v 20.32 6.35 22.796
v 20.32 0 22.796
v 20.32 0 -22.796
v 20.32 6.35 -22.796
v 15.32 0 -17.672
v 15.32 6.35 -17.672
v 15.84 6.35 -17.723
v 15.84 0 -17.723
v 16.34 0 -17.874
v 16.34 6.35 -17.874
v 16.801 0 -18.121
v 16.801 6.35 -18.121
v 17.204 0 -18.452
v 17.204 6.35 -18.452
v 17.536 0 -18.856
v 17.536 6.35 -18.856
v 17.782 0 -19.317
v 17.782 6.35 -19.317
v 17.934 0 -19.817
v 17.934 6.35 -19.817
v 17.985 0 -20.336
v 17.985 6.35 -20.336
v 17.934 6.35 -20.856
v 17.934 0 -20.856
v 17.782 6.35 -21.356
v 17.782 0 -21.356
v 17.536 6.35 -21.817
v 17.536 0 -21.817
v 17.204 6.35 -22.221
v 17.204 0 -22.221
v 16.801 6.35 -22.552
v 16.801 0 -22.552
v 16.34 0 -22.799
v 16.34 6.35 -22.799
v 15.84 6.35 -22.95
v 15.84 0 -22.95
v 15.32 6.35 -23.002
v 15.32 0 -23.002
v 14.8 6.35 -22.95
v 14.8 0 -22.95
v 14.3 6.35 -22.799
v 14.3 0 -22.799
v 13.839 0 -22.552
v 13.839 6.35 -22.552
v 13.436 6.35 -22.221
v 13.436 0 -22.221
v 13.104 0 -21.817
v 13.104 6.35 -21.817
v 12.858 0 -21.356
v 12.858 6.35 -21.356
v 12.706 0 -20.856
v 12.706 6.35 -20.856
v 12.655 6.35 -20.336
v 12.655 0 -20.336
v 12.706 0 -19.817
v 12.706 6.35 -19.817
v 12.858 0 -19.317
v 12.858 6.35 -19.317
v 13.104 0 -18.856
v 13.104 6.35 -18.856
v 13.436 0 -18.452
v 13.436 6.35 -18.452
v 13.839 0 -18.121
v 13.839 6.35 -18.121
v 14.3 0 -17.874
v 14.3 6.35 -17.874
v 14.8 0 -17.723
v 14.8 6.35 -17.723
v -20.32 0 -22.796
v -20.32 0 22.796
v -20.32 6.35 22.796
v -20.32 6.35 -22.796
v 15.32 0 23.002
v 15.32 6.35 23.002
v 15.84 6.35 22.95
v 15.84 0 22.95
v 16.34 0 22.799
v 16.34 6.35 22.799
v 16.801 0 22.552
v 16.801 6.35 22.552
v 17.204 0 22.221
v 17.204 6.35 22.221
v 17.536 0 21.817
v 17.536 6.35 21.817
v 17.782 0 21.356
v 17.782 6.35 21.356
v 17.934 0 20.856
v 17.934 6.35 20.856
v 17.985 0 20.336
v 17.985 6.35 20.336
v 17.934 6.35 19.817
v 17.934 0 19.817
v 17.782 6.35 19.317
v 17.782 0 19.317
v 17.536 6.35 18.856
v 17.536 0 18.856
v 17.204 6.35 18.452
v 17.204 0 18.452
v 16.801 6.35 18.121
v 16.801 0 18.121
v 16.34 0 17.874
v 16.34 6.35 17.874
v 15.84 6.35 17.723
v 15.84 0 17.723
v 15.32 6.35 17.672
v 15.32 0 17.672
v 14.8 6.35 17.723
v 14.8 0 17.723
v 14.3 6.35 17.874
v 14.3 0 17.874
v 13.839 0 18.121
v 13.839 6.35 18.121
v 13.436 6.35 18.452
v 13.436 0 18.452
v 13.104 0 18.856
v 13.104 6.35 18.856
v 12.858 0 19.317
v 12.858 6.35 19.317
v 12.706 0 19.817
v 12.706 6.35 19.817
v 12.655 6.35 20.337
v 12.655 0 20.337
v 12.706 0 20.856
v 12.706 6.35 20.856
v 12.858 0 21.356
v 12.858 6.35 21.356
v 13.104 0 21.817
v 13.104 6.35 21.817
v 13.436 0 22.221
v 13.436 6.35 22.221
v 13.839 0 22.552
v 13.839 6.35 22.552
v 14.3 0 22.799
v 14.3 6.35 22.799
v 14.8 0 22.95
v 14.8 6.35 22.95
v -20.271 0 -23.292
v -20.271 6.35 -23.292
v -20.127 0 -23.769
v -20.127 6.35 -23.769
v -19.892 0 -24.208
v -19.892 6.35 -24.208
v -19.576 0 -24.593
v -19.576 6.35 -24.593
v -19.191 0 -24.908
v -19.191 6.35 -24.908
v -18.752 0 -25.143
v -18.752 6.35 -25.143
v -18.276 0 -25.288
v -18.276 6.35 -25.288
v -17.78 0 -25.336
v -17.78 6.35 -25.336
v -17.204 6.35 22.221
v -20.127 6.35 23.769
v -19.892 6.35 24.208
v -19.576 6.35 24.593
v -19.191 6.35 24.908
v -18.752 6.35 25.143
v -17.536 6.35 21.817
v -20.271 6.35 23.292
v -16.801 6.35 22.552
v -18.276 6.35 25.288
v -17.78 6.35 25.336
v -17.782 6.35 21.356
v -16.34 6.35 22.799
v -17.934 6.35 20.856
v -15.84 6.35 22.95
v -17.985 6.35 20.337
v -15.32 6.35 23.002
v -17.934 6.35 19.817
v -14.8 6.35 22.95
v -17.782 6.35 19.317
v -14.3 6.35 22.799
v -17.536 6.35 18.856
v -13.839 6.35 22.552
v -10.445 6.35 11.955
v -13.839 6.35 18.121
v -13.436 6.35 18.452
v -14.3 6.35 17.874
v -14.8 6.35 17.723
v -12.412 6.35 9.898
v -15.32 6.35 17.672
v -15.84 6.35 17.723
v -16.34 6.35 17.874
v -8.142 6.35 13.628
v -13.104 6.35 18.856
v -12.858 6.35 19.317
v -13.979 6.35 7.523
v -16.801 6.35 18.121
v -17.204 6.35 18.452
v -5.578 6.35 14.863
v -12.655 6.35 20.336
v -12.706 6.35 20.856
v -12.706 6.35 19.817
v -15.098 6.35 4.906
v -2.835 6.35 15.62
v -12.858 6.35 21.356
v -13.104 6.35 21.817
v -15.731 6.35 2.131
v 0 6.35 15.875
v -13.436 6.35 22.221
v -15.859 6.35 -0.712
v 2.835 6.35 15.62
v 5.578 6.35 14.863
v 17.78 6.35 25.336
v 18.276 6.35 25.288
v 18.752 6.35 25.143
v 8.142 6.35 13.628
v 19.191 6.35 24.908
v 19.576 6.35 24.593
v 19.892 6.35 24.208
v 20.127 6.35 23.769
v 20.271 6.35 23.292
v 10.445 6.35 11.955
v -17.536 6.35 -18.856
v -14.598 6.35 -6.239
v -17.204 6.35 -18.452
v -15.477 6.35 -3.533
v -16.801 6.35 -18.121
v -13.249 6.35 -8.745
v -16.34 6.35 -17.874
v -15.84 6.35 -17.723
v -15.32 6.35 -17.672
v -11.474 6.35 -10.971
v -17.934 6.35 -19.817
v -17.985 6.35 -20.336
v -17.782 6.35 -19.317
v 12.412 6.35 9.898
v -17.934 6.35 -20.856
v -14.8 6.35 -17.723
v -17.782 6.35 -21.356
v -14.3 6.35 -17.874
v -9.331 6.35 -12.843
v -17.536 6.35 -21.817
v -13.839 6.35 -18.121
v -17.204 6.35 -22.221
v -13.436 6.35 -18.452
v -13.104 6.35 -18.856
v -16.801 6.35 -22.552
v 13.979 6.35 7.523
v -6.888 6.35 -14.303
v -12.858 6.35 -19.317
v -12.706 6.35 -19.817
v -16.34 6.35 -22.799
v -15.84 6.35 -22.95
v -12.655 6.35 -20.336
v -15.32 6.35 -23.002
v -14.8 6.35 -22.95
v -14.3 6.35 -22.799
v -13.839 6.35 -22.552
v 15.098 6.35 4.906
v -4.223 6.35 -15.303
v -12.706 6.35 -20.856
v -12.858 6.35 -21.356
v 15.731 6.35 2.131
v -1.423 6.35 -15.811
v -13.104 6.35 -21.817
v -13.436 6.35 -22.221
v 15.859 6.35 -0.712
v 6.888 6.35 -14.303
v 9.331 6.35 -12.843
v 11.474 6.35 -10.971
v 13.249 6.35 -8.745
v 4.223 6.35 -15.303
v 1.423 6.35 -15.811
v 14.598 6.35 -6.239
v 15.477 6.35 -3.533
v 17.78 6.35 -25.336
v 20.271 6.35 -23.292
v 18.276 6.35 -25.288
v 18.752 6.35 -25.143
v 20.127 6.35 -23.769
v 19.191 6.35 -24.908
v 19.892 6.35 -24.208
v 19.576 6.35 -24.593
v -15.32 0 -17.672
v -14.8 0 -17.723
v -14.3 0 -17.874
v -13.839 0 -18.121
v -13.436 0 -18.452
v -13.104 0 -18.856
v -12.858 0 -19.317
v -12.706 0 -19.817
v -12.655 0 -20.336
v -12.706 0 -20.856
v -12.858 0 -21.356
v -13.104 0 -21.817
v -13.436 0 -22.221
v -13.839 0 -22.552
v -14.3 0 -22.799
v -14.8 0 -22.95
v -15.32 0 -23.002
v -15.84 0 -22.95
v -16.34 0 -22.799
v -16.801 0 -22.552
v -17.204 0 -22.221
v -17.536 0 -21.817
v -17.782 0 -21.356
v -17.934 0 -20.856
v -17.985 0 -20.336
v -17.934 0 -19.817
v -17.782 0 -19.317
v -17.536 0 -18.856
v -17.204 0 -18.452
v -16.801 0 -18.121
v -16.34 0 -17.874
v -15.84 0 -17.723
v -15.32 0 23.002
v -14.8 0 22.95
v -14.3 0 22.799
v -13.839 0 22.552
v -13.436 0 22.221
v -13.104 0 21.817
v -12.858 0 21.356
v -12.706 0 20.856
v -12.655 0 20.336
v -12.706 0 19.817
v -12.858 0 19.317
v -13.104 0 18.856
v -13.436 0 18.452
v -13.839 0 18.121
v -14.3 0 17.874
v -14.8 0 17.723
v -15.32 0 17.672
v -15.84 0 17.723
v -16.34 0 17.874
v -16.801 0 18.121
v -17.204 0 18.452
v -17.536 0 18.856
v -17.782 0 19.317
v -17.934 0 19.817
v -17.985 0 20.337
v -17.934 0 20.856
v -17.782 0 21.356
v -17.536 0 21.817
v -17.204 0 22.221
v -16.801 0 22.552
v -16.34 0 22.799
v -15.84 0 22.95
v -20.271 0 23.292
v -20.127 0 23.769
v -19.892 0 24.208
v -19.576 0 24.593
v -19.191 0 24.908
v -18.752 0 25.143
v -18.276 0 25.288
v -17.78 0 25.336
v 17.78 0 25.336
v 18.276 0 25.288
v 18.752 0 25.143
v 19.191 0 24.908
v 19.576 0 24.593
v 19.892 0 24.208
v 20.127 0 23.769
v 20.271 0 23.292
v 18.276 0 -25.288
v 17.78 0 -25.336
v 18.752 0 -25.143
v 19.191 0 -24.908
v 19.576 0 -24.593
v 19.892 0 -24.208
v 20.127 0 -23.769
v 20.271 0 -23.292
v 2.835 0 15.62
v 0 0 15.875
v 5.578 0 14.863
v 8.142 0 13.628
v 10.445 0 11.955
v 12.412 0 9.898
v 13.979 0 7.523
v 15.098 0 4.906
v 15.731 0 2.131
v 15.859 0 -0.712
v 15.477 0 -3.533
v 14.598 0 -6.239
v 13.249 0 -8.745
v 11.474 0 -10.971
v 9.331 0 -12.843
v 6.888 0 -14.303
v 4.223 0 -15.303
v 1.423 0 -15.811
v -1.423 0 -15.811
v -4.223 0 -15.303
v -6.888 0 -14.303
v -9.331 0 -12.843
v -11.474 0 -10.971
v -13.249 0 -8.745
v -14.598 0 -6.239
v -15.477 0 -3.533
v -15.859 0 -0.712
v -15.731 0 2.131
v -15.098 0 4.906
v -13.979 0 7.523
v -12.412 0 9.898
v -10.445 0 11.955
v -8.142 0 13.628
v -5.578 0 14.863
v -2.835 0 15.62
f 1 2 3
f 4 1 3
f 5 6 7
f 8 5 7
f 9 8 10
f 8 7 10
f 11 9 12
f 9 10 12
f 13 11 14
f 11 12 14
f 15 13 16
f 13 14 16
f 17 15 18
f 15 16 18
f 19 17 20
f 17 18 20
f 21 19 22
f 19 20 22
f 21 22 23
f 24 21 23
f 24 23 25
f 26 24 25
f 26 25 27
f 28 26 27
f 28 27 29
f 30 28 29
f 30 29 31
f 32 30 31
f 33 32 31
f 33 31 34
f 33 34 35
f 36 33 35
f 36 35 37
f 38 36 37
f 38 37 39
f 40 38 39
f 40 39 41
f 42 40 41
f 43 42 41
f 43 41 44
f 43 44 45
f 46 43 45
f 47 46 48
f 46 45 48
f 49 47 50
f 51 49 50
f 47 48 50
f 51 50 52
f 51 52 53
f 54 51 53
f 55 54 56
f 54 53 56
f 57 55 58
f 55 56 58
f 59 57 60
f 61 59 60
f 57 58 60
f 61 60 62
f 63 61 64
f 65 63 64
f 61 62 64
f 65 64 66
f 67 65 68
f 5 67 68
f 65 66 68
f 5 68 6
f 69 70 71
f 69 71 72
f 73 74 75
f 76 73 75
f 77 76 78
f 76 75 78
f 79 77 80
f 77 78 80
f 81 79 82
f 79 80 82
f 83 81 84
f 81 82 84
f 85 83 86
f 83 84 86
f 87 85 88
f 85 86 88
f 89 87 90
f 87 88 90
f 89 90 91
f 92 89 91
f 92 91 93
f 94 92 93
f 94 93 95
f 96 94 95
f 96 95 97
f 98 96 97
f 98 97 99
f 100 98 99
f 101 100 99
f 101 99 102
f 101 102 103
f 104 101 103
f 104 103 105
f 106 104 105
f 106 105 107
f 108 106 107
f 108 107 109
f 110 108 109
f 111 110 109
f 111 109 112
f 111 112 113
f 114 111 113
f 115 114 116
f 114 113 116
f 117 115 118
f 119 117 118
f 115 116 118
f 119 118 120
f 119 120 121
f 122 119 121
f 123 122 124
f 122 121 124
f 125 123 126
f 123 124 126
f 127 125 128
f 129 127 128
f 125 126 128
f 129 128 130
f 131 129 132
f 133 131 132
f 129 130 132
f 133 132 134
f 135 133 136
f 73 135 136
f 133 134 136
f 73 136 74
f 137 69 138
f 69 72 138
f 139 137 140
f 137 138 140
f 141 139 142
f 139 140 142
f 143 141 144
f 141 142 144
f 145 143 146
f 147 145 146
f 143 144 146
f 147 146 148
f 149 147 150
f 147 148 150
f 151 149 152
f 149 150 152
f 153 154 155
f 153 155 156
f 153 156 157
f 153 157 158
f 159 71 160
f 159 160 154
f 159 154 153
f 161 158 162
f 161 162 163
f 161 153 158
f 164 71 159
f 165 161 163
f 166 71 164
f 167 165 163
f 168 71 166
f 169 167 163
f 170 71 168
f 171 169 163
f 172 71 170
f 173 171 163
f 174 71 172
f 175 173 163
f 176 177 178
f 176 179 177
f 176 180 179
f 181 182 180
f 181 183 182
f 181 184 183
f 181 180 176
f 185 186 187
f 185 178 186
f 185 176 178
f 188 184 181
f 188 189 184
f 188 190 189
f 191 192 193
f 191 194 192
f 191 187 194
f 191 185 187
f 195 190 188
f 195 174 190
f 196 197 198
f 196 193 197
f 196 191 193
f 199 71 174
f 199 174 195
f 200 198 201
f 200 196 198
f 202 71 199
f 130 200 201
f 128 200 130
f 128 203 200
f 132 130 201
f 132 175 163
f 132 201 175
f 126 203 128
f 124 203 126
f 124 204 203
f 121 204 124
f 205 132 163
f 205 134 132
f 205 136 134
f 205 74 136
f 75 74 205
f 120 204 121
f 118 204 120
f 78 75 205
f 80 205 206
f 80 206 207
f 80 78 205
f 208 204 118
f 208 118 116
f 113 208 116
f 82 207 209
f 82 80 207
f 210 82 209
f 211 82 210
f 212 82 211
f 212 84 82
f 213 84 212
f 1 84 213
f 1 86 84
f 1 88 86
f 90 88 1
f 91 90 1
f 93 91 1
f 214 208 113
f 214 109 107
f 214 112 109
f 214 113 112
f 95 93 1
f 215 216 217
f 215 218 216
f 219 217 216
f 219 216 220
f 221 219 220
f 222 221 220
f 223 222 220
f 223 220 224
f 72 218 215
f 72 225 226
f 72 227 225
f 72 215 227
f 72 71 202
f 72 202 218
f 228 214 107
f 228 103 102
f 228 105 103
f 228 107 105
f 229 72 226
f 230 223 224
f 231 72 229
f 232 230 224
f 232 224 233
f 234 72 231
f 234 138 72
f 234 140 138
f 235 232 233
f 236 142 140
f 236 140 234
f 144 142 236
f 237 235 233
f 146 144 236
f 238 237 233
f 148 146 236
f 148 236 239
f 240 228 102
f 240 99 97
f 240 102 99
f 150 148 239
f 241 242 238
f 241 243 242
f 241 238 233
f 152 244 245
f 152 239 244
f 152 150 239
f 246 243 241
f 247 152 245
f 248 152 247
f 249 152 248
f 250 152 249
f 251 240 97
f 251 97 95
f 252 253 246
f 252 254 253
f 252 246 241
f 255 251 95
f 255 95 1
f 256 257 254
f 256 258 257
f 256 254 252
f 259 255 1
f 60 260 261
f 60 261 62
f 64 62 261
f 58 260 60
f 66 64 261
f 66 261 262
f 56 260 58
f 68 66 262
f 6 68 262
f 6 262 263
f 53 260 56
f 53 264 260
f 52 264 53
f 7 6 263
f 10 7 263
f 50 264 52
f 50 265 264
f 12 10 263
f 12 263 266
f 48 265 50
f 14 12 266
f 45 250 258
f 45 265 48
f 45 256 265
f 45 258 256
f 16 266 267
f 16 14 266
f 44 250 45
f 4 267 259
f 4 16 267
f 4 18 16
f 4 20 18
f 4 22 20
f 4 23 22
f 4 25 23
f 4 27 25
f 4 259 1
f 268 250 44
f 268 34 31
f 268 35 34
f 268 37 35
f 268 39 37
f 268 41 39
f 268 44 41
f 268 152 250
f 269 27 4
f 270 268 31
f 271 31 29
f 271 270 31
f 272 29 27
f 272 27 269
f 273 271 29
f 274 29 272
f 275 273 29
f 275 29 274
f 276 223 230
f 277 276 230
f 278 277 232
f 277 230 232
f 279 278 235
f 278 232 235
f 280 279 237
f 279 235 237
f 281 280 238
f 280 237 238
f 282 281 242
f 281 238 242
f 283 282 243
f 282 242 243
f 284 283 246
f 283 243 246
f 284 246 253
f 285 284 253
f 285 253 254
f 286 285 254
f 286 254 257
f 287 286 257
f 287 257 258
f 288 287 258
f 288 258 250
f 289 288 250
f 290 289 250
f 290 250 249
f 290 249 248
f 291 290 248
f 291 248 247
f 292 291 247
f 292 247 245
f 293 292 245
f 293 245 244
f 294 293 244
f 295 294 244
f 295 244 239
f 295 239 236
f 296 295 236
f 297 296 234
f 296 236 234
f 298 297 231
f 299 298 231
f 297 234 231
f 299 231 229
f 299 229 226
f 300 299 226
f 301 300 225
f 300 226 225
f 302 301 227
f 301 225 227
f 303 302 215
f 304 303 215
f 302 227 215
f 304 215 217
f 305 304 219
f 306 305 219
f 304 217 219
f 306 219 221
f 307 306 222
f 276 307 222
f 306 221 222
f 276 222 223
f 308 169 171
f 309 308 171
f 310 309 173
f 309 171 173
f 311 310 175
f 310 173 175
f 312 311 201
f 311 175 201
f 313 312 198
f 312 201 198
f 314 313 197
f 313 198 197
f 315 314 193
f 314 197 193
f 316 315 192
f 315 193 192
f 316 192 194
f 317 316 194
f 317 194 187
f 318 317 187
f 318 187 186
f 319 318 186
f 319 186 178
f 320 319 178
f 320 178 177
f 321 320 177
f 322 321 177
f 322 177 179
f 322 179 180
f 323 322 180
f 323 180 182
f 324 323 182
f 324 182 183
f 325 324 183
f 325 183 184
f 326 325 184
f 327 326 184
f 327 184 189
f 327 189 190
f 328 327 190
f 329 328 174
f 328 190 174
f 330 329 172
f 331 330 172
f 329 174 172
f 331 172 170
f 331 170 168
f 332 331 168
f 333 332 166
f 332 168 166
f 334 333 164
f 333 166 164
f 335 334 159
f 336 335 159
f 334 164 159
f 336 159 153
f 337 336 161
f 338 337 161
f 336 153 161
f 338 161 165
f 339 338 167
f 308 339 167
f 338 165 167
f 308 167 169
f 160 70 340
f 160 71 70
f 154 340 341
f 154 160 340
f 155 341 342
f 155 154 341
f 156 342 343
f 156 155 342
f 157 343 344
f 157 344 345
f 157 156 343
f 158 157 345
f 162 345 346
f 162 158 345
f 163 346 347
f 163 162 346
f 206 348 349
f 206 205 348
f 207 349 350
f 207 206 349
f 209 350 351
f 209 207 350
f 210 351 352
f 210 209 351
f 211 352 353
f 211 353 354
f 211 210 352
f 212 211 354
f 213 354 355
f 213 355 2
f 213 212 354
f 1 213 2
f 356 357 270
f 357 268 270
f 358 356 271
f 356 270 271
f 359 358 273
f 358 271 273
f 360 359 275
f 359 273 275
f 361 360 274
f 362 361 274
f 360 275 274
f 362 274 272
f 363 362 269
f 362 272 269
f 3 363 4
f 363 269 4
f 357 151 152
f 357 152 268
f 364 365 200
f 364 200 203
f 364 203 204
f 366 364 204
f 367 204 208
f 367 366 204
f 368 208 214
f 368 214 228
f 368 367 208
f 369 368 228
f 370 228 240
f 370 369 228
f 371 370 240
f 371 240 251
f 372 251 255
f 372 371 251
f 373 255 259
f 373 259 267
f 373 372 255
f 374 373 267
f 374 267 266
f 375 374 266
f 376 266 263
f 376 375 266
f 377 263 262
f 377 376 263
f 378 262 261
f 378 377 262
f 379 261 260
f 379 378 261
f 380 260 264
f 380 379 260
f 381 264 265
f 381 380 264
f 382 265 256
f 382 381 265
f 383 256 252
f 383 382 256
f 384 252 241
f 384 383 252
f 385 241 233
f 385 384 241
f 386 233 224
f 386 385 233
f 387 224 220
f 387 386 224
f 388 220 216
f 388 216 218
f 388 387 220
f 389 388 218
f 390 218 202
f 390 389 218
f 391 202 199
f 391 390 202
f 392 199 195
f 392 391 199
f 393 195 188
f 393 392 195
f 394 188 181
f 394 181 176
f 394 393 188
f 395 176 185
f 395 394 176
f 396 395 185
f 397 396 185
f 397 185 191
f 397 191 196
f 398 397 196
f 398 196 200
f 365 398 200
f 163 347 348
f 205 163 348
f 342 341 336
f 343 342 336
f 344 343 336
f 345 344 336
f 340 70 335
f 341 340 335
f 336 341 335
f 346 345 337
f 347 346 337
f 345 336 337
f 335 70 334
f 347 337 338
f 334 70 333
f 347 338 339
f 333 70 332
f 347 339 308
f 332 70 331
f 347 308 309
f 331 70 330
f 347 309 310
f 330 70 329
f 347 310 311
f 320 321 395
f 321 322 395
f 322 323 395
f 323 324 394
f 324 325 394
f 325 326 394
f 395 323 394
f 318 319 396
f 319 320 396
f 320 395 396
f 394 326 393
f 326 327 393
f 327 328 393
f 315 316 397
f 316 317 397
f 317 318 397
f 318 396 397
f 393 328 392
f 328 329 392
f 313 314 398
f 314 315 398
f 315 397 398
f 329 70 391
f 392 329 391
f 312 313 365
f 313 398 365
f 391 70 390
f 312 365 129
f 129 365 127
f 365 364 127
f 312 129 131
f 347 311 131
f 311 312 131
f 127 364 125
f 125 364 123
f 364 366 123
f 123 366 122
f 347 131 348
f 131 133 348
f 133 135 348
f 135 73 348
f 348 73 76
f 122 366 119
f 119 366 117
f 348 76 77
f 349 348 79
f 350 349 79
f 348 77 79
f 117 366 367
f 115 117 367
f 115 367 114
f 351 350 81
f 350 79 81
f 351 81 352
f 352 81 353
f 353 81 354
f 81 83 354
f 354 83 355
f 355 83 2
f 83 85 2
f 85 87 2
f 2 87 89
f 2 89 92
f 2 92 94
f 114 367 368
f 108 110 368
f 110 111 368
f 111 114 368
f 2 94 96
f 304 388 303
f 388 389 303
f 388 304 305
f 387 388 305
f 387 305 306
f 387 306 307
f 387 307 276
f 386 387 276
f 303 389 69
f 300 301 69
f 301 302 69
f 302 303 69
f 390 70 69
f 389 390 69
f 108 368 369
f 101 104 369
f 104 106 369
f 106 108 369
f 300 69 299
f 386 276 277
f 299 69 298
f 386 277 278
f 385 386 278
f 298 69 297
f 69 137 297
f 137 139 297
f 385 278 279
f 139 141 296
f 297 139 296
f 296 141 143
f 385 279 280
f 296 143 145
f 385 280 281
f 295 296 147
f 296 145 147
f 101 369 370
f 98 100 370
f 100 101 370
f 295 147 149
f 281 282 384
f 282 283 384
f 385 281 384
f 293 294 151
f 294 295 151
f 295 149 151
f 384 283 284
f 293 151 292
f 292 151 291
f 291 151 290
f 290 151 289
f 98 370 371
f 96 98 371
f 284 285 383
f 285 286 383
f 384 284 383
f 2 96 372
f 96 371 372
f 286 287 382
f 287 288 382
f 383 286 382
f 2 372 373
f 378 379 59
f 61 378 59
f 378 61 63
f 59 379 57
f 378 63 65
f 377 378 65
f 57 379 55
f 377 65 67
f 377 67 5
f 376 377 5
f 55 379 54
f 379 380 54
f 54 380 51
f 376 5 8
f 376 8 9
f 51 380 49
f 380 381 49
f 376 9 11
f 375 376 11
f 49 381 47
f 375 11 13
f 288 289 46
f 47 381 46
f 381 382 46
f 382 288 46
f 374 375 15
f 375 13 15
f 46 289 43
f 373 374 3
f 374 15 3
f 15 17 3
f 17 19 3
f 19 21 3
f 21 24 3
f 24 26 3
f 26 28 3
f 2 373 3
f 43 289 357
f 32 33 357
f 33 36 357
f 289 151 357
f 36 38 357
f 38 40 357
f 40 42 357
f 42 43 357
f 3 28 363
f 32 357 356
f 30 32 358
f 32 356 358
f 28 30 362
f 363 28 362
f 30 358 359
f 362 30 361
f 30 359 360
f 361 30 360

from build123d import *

# Parameters (mm, degrees)
SKETCH1_W           = 40.64
SKETCH1_H           = 50.673
SKETCH1_R           = 15.875
BOSS_EXTRUDE1_DEPTH = 6.35
CUT_EXTRUDE1_REACH  = 35.093
SKETCH2_R           = 2.665
FILLET1_R           = 2.54


with BuildPart() as part:
    # Sketch1 → Boss-Extrude1 (new body)
    with BuildSketch(Plane(origin=(0, 0, 0), x_dir=(1, 0, 0), z_dir=(0, 1, 0))):
        Rectangle(SKETCH1_W, SKETCH1_H)
        with Locations(Location((0, 0, 0), (0, 0, 270))):
            Circle(SKETCH1_R, mode=Mode.SUBTRACT)
    extrude(amount=BOSS_EXTRUDE1_DEPTH)

    # Sketch2 → Cut-Extrude1 (cut, up to next)
    with BuildSketch(Plane(origin=(0, 6.35, 0), x_dir=(1, 0, 0), z_dir=(0, 1, 0)), mode=Mode.PRIVATE) as cut_extrude1_sk1:
        with Locations(Location((-15.32, 20.3365, 0), (0, 0, 270))):
            Circle(SKETCH2_R)
    cut_extrude1_tool1 = extrude(cut_extrude1_sk1.sketch, amount=-CUT_EXTRUDE1_REACH, mode=Mode.PRIVATE) & part.part
    # Sketch2 → Cut-Extrude1 (cut, up to next)
    with BuildSketch(Plane(origin=(0, 6.35, 0), x_dir=(1, 0, 0), z_dir=(0, 1, 0)), mode=Mode.PRIVATE) as cut_extrude1_sk2:
        with Locations(Location((15.32, 20.3365, 0), (0, 0, 270))):
            Circle(SKETCH2_R)
    cut_extrude1_tool2 = extrude(cut_extrude1_sk2.sketch, amount=-CUT_EXTRUDE1_REACH, mode=Mode.PRIVATE) & part.part
    # Sketch2 → Cut-Extrude1 (cut, up to next)
    with BuildSketch(Plane(origin=(0, 6.35, 0), x_dir=(1, 0, 0), z_dir=(0, 1, 0)), mode=Mode.PRIVATE) as cut_extrude1_sk3:
        with Locations(Location((15.32, -20.3365, 0), (0, 0, 270))):
            Circle(SKETCH2_R)
    cut_extrude1_tool3 = extrude(cut_extrude1_sk3.sketch, amount=-CUT_EXTRUDE1_REACH, mode=Mode.PRIVATE) & part.part
    # Sketch2 → Cut-Extrude1 (cut, up to next)
    with BuildSketch(Plane(origin=(0, 6.35, 0), x_dir=(1, 0, 0), z_dir=(0, 1, 0)), mode=Mode.PRIVATE) as cut_extrude1_sk4:
        with Locations(Location((-15.32, -20.3365, 0), (0, 0, 270))):
            Circle(SKETCH2_R)
    cut_extrude1_tool4 = extrude(cut_extrude1_sk4.sketch, amount=-CUT_EXTRUDE1_REACH, mode=Mode.PRIVATE) & part.part
    add(cut_extrude1_tool1.solids().sort_by_distance((-15.32, 6.35, -20.3365))[0], mode=Mode.SUBTRACT)
    add(cut_extrude1_tool2.solids().sort_by_distance((15.32, 6.35, -20.3365))[0], mode=Mode.SUBTRACT)
    add(cut_extrude1_tool3.solids().sort_by_distance((15.32, 6.35, 20.3365))[0], mode=Mode.SUBTRACT)
    add(cut_extrude1_tool4.solids().sort_by_distance((-15.32, 6.35, 20.3365))[0], mode=Mode.SUBTRACT)

    # Fillet1
    fillet1_edges = [part.edges().sort_by_distance(p)[0] for p in [
        (20.32, 3.175, 25.3365),
        (-20.32, 3.175, 25.3365),
        (-20.32, 3.175, -25.3365),
        (20.32, 3.175, -25.3365),
    ]]
    fillet(fillet1_edges, radius=FILLET1_R)


solid = part.part
